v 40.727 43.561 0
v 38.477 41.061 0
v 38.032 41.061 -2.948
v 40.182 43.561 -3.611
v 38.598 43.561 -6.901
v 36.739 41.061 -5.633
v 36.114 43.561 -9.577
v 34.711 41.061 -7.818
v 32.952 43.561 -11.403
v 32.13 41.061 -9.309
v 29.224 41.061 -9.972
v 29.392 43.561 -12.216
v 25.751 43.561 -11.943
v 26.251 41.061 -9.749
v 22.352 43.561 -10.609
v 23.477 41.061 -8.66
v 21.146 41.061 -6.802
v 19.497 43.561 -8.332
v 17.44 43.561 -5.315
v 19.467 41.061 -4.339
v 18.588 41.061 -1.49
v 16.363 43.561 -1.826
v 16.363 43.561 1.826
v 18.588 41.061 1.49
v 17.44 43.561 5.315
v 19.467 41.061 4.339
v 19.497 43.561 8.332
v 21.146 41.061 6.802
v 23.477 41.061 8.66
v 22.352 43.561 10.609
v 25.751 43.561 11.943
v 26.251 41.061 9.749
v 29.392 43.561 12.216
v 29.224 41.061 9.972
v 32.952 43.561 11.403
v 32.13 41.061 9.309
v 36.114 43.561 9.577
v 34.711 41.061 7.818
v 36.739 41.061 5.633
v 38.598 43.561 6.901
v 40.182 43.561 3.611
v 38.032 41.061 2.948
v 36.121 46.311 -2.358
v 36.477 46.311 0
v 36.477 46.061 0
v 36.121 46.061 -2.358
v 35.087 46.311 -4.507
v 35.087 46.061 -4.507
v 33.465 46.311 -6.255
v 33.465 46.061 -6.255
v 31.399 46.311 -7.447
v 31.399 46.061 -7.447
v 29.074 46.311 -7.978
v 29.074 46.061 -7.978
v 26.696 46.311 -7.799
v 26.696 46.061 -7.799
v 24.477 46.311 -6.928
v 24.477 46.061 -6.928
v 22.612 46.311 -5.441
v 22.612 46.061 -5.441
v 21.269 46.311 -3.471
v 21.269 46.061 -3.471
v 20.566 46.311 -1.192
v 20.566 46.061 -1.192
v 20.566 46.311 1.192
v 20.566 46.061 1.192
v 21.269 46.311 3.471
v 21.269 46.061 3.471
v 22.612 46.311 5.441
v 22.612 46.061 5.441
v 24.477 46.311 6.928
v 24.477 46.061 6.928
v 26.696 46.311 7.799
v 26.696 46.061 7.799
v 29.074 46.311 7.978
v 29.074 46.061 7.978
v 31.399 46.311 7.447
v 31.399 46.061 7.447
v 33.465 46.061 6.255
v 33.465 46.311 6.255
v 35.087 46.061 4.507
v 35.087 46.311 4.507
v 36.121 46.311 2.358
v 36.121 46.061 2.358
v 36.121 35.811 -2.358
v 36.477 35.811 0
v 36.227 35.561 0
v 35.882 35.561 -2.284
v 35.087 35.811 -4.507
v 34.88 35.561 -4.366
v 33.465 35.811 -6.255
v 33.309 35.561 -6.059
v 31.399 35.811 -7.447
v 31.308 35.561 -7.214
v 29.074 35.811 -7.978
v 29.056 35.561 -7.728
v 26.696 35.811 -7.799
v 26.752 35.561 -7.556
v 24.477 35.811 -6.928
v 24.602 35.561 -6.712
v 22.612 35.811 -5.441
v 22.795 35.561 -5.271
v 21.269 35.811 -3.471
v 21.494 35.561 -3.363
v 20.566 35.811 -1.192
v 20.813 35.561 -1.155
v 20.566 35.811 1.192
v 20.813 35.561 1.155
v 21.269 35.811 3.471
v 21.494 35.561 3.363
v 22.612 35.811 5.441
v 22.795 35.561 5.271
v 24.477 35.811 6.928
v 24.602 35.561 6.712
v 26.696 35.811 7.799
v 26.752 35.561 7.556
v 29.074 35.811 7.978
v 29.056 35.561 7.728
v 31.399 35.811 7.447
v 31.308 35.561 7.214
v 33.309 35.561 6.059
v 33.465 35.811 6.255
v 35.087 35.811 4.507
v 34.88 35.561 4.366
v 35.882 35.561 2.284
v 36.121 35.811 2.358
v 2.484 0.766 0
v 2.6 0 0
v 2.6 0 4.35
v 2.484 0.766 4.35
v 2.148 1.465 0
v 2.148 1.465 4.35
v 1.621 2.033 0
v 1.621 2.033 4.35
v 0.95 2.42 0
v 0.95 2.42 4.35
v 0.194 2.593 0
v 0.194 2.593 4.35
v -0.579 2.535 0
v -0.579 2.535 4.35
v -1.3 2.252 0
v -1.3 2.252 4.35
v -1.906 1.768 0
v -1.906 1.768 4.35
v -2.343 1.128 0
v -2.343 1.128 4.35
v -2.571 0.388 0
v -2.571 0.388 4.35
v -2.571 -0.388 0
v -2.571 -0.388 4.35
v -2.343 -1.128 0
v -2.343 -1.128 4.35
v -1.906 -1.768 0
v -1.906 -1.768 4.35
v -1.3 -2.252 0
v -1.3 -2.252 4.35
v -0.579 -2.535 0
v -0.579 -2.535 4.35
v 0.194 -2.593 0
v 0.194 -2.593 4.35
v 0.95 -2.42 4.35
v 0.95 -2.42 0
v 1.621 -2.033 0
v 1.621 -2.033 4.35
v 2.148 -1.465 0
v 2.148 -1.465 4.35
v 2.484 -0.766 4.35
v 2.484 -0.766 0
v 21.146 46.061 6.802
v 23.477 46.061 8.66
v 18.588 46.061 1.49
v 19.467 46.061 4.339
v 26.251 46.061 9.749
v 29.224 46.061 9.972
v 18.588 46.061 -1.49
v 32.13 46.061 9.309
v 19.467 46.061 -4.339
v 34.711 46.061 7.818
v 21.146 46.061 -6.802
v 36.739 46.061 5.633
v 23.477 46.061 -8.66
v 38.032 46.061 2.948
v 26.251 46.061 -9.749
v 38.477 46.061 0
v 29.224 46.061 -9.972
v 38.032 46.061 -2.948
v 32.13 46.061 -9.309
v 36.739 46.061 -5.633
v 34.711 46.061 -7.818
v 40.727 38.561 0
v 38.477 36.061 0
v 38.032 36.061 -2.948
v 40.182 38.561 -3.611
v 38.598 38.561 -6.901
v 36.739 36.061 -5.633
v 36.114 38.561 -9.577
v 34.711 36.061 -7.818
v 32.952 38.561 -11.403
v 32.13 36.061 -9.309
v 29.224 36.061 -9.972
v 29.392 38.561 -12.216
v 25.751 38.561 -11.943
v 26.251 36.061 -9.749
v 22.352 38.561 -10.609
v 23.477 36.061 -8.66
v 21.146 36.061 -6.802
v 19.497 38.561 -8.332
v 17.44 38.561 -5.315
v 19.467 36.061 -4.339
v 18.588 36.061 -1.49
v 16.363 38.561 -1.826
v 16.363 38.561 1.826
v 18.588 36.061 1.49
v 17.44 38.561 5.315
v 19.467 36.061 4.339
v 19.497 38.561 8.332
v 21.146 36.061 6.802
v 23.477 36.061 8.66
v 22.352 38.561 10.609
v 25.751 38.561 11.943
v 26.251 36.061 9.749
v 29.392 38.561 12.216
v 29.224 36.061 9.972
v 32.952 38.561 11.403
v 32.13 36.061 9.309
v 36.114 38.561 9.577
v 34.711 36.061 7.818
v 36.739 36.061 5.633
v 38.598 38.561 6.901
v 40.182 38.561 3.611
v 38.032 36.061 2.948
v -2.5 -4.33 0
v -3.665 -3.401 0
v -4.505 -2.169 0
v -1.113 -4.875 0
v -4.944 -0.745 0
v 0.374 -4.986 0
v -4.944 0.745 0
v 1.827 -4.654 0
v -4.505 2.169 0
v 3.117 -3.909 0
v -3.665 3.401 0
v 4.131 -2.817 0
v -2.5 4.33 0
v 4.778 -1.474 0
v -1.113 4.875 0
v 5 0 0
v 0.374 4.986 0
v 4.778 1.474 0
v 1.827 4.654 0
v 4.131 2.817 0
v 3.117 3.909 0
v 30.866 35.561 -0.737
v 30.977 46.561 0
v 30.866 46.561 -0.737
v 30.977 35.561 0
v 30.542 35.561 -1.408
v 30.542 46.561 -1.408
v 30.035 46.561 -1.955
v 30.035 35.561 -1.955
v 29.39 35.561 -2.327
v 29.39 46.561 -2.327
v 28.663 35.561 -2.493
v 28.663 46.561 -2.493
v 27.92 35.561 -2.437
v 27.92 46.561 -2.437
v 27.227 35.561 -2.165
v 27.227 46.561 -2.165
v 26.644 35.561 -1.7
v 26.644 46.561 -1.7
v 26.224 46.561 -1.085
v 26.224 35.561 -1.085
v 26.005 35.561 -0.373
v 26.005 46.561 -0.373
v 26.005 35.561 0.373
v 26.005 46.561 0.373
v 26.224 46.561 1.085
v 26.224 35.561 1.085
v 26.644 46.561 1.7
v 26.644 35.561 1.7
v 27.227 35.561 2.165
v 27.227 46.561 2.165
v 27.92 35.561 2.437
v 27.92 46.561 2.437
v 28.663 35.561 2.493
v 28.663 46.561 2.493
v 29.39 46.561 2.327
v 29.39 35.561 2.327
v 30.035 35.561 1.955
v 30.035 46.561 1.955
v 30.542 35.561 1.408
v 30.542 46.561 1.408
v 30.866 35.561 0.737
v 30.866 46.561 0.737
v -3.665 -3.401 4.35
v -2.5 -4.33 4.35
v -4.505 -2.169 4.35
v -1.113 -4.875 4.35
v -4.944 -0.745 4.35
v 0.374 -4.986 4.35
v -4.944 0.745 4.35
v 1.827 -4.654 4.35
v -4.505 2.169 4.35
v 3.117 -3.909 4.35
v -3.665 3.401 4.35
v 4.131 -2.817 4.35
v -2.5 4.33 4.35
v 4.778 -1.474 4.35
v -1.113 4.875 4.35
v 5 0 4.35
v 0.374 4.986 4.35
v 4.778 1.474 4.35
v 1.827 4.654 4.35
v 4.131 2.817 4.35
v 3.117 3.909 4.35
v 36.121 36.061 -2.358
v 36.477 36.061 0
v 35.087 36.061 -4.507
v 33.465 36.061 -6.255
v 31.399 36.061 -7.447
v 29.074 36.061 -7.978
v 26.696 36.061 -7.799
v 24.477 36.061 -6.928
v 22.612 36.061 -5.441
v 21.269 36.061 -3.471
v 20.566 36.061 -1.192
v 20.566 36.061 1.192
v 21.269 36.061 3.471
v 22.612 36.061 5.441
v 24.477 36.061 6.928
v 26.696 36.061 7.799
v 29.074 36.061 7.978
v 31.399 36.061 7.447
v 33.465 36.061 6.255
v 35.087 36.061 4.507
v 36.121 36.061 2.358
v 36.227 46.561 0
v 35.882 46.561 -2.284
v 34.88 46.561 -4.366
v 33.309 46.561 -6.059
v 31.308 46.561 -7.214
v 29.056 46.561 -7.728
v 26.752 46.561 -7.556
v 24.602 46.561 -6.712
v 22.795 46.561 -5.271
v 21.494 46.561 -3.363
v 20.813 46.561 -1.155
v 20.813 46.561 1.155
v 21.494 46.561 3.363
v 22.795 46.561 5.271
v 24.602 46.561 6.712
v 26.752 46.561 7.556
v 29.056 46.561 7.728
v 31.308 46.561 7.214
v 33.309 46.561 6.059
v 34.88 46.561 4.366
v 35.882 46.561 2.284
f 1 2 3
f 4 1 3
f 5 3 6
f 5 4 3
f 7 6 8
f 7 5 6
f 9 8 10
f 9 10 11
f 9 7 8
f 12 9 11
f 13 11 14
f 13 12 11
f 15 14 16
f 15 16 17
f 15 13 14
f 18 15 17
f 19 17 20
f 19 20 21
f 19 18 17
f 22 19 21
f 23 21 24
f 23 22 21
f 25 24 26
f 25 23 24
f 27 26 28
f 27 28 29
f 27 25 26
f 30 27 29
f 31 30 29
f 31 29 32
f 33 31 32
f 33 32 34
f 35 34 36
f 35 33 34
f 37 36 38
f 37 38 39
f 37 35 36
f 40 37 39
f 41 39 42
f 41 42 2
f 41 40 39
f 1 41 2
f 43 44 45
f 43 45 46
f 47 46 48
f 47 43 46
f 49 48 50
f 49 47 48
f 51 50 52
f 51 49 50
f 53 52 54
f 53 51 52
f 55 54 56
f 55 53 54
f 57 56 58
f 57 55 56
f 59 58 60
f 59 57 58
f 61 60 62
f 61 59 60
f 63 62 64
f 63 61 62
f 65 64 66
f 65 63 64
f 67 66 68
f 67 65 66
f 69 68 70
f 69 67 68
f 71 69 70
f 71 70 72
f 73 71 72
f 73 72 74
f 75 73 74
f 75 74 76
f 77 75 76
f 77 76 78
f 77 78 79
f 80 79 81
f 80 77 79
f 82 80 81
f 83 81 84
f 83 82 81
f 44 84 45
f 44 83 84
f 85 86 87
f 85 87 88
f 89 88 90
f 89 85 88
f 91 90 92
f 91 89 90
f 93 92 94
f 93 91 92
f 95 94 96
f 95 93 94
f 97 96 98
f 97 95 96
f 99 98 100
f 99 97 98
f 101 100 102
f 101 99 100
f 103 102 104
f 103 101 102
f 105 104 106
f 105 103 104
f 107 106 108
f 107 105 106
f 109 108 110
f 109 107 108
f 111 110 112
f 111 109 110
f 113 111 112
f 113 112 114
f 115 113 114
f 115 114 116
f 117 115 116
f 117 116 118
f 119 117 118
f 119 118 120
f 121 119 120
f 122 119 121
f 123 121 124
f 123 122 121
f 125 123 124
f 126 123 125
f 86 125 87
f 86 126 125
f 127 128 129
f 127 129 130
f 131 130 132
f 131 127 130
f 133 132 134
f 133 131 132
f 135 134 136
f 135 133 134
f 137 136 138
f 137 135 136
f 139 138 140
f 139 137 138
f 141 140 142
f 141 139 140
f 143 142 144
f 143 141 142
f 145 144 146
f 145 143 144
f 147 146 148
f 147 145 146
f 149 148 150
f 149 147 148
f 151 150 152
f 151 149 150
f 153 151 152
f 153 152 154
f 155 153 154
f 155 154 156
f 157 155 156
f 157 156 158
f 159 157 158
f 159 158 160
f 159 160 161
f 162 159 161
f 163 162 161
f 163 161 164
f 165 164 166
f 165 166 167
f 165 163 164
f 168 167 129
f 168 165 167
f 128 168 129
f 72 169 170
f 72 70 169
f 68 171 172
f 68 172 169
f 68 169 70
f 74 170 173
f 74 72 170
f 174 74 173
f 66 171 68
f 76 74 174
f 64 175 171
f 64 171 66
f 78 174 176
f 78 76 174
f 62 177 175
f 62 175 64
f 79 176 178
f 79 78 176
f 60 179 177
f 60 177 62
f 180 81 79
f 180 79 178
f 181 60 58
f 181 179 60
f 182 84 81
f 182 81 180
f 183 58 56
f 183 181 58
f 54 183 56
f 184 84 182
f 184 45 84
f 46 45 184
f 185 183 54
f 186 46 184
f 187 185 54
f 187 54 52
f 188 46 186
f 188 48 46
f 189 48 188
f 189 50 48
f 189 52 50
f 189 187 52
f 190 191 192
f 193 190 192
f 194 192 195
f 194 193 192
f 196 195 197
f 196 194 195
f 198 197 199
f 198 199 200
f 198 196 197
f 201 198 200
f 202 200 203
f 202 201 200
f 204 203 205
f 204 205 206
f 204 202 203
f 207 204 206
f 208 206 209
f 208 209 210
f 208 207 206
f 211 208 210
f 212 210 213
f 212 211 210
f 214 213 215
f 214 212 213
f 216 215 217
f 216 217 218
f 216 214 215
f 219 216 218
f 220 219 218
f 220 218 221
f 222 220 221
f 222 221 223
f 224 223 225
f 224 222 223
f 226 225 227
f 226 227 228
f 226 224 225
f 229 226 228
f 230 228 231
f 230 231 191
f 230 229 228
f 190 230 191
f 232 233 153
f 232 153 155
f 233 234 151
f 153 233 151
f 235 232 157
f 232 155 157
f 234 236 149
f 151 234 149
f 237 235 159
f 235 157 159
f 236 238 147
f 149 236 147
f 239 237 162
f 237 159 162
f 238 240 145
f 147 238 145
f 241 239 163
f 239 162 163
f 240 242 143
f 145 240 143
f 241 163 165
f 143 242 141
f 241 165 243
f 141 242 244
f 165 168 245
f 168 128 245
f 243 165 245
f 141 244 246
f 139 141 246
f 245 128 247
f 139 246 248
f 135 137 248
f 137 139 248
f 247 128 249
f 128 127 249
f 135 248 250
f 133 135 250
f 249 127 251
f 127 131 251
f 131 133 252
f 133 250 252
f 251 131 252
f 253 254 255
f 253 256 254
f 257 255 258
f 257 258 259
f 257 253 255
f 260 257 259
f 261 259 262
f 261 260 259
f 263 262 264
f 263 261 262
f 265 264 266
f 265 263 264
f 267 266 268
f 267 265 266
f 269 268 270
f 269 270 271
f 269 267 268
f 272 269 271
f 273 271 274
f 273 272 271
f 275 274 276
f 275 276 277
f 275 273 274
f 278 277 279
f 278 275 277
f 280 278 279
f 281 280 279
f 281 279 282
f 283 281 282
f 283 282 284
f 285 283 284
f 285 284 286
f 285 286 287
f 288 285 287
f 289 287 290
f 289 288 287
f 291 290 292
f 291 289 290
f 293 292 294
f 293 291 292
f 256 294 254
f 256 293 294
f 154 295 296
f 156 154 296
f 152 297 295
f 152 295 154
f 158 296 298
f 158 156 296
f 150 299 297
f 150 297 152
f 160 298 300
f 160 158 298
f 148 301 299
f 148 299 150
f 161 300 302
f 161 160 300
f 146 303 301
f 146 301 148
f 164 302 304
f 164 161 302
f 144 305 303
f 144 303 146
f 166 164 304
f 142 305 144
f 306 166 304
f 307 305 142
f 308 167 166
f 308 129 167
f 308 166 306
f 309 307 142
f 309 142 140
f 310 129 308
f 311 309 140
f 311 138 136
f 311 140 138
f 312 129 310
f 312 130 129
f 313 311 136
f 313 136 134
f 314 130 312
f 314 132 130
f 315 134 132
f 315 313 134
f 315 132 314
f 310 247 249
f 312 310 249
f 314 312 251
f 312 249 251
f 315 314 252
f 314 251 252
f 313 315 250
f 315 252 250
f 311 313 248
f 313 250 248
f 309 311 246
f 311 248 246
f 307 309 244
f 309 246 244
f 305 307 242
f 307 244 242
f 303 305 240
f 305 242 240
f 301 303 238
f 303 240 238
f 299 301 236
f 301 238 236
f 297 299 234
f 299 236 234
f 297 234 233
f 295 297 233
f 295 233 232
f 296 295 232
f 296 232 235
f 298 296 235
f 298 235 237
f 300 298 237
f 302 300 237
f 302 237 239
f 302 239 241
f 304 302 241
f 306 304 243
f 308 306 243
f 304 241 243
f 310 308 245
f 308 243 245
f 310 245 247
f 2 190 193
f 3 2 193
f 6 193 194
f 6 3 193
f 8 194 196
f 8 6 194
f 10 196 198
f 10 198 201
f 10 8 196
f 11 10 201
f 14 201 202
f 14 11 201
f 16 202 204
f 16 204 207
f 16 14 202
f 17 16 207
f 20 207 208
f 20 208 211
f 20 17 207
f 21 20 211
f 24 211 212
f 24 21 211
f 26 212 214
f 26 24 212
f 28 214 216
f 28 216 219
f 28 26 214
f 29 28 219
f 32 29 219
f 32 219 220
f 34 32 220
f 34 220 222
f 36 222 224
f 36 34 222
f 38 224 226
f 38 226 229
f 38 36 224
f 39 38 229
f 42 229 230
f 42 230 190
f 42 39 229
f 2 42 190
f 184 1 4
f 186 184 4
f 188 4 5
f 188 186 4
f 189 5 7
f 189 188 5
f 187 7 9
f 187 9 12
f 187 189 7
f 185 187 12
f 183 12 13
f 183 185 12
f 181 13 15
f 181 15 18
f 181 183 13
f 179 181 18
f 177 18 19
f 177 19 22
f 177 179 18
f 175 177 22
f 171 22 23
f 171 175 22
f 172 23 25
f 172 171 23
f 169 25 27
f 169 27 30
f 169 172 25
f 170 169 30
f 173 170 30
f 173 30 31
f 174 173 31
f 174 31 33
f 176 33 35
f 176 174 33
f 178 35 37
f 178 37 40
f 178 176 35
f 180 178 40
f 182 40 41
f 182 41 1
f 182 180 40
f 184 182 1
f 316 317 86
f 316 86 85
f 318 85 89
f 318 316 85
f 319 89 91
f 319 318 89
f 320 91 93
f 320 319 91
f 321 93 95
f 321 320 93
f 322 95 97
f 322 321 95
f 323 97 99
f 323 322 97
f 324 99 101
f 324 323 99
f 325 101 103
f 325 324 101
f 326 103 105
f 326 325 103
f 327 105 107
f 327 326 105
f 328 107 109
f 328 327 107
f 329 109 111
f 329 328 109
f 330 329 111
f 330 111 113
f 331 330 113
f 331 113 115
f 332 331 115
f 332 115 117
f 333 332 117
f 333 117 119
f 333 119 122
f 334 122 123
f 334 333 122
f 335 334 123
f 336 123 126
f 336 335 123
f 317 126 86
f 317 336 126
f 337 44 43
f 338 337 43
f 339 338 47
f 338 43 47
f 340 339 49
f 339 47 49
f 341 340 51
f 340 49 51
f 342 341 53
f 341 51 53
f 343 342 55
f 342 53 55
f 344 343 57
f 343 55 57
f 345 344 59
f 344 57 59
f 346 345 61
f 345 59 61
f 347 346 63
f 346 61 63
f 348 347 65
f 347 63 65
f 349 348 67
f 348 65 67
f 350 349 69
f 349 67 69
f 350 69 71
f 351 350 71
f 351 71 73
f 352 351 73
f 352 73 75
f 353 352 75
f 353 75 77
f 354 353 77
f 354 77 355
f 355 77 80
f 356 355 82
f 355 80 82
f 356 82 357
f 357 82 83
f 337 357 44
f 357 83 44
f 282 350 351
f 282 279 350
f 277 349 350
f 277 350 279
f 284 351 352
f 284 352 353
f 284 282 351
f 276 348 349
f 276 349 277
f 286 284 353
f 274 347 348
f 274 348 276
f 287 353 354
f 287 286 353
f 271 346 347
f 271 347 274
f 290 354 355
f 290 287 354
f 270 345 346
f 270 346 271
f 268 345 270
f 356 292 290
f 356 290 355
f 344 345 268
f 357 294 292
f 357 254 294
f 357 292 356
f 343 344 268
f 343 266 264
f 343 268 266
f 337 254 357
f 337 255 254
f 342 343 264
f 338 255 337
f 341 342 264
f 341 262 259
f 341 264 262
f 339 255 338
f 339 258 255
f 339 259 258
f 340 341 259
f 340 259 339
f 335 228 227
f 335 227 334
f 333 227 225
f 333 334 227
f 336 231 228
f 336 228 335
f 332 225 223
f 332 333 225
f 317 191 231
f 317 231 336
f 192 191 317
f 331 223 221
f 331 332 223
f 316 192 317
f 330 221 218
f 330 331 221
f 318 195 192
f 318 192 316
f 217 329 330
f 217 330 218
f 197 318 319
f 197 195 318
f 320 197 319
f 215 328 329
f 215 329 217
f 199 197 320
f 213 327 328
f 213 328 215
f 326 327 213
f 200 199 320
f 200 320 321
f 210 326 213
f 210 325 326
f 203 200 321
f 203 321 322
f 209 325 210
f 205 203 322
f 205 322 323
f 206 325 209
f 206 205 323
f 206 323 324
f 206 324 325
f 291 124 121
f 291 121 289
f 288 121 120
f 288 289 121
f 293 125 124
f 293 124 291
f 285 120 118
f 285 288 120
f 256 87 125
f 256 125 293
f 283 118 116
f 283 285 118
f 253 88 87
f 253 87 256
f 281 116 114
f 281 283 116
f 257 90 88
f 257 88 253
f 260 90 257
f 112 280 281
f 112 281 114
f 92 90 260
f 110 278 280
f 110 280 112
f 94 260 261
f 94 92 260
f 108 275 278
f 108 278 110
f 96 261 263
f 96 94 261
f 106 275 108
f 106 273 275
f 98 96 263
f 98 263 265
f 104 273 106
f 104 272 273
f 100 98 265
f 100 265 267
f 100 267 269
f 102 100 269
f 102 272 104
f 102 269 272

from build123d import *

# Parameters (mm, degrees)
F0_R     = 5
F0_R_2   = 2.6
F1_DEPTH = 4.35
F4_SIZE  = 0.25
F5_SIZE  = 0.25


with BuildPart() as f1:
    # F0 (on Top) → F1 (new body)
    with BuildSketch(Plane.XY):
        Circle(F0_R)
        Circle(F0_R_2, mode=Mode.SUBTRACT)
    extrude(amount=F1_DEPTH)


with BuildPart() as f3:
    # F2 (on Top) → F3 (revolve)
    with BuildSketch(Plane.XY):
        Polygon((36.4766009152, 46.5609329939), (30.9766009152, 46.5609329939), (30.9766009152, 35.5609329939), (36.4766009152, 35.5609329939), (36.4766009152, 36.0609329939), (36.4766009152, 46.0609329939), align=None)
        Polygon((38.4766009152, 46.0609329939), (36.4766009152, 46.0609329939), (36.4766009152, 36.0609329939), (38.4766009152, 36.0609329939), (38.4766009152, 41.0609329939), align=None)
        Polygon((40.7266009152, 43.5609329939), (38.4766009152, 46.0609329939), (38.4766009152, 41.0609329939), align=None)
        Polygon((38.4766009152, 41.0609329939), (38.4766009152, 36.0609329939), (40.7266009152, 38.5609329939), align=None)
    revolve(axis=Axis((28.4766009152, 40.2543731332, 0), (0, 1, 0)))

    # F4
    f4_edges = [f3.edges().sort_by_distance(p)[0] for p in [
        (20.476601, 35.560933, 0),
    ]]
    chamfer(f4_edges, length=F4_SIZE)

    # F5
    f5_edges = [f3.edges().sort_by_distance(p)[0] for p in [
        (20.476601, 46.560933, 0),
    ]]
    chamfer(f5_edges, length=F5_SIZE)


solid = Compound([f1.part, f3.part])
